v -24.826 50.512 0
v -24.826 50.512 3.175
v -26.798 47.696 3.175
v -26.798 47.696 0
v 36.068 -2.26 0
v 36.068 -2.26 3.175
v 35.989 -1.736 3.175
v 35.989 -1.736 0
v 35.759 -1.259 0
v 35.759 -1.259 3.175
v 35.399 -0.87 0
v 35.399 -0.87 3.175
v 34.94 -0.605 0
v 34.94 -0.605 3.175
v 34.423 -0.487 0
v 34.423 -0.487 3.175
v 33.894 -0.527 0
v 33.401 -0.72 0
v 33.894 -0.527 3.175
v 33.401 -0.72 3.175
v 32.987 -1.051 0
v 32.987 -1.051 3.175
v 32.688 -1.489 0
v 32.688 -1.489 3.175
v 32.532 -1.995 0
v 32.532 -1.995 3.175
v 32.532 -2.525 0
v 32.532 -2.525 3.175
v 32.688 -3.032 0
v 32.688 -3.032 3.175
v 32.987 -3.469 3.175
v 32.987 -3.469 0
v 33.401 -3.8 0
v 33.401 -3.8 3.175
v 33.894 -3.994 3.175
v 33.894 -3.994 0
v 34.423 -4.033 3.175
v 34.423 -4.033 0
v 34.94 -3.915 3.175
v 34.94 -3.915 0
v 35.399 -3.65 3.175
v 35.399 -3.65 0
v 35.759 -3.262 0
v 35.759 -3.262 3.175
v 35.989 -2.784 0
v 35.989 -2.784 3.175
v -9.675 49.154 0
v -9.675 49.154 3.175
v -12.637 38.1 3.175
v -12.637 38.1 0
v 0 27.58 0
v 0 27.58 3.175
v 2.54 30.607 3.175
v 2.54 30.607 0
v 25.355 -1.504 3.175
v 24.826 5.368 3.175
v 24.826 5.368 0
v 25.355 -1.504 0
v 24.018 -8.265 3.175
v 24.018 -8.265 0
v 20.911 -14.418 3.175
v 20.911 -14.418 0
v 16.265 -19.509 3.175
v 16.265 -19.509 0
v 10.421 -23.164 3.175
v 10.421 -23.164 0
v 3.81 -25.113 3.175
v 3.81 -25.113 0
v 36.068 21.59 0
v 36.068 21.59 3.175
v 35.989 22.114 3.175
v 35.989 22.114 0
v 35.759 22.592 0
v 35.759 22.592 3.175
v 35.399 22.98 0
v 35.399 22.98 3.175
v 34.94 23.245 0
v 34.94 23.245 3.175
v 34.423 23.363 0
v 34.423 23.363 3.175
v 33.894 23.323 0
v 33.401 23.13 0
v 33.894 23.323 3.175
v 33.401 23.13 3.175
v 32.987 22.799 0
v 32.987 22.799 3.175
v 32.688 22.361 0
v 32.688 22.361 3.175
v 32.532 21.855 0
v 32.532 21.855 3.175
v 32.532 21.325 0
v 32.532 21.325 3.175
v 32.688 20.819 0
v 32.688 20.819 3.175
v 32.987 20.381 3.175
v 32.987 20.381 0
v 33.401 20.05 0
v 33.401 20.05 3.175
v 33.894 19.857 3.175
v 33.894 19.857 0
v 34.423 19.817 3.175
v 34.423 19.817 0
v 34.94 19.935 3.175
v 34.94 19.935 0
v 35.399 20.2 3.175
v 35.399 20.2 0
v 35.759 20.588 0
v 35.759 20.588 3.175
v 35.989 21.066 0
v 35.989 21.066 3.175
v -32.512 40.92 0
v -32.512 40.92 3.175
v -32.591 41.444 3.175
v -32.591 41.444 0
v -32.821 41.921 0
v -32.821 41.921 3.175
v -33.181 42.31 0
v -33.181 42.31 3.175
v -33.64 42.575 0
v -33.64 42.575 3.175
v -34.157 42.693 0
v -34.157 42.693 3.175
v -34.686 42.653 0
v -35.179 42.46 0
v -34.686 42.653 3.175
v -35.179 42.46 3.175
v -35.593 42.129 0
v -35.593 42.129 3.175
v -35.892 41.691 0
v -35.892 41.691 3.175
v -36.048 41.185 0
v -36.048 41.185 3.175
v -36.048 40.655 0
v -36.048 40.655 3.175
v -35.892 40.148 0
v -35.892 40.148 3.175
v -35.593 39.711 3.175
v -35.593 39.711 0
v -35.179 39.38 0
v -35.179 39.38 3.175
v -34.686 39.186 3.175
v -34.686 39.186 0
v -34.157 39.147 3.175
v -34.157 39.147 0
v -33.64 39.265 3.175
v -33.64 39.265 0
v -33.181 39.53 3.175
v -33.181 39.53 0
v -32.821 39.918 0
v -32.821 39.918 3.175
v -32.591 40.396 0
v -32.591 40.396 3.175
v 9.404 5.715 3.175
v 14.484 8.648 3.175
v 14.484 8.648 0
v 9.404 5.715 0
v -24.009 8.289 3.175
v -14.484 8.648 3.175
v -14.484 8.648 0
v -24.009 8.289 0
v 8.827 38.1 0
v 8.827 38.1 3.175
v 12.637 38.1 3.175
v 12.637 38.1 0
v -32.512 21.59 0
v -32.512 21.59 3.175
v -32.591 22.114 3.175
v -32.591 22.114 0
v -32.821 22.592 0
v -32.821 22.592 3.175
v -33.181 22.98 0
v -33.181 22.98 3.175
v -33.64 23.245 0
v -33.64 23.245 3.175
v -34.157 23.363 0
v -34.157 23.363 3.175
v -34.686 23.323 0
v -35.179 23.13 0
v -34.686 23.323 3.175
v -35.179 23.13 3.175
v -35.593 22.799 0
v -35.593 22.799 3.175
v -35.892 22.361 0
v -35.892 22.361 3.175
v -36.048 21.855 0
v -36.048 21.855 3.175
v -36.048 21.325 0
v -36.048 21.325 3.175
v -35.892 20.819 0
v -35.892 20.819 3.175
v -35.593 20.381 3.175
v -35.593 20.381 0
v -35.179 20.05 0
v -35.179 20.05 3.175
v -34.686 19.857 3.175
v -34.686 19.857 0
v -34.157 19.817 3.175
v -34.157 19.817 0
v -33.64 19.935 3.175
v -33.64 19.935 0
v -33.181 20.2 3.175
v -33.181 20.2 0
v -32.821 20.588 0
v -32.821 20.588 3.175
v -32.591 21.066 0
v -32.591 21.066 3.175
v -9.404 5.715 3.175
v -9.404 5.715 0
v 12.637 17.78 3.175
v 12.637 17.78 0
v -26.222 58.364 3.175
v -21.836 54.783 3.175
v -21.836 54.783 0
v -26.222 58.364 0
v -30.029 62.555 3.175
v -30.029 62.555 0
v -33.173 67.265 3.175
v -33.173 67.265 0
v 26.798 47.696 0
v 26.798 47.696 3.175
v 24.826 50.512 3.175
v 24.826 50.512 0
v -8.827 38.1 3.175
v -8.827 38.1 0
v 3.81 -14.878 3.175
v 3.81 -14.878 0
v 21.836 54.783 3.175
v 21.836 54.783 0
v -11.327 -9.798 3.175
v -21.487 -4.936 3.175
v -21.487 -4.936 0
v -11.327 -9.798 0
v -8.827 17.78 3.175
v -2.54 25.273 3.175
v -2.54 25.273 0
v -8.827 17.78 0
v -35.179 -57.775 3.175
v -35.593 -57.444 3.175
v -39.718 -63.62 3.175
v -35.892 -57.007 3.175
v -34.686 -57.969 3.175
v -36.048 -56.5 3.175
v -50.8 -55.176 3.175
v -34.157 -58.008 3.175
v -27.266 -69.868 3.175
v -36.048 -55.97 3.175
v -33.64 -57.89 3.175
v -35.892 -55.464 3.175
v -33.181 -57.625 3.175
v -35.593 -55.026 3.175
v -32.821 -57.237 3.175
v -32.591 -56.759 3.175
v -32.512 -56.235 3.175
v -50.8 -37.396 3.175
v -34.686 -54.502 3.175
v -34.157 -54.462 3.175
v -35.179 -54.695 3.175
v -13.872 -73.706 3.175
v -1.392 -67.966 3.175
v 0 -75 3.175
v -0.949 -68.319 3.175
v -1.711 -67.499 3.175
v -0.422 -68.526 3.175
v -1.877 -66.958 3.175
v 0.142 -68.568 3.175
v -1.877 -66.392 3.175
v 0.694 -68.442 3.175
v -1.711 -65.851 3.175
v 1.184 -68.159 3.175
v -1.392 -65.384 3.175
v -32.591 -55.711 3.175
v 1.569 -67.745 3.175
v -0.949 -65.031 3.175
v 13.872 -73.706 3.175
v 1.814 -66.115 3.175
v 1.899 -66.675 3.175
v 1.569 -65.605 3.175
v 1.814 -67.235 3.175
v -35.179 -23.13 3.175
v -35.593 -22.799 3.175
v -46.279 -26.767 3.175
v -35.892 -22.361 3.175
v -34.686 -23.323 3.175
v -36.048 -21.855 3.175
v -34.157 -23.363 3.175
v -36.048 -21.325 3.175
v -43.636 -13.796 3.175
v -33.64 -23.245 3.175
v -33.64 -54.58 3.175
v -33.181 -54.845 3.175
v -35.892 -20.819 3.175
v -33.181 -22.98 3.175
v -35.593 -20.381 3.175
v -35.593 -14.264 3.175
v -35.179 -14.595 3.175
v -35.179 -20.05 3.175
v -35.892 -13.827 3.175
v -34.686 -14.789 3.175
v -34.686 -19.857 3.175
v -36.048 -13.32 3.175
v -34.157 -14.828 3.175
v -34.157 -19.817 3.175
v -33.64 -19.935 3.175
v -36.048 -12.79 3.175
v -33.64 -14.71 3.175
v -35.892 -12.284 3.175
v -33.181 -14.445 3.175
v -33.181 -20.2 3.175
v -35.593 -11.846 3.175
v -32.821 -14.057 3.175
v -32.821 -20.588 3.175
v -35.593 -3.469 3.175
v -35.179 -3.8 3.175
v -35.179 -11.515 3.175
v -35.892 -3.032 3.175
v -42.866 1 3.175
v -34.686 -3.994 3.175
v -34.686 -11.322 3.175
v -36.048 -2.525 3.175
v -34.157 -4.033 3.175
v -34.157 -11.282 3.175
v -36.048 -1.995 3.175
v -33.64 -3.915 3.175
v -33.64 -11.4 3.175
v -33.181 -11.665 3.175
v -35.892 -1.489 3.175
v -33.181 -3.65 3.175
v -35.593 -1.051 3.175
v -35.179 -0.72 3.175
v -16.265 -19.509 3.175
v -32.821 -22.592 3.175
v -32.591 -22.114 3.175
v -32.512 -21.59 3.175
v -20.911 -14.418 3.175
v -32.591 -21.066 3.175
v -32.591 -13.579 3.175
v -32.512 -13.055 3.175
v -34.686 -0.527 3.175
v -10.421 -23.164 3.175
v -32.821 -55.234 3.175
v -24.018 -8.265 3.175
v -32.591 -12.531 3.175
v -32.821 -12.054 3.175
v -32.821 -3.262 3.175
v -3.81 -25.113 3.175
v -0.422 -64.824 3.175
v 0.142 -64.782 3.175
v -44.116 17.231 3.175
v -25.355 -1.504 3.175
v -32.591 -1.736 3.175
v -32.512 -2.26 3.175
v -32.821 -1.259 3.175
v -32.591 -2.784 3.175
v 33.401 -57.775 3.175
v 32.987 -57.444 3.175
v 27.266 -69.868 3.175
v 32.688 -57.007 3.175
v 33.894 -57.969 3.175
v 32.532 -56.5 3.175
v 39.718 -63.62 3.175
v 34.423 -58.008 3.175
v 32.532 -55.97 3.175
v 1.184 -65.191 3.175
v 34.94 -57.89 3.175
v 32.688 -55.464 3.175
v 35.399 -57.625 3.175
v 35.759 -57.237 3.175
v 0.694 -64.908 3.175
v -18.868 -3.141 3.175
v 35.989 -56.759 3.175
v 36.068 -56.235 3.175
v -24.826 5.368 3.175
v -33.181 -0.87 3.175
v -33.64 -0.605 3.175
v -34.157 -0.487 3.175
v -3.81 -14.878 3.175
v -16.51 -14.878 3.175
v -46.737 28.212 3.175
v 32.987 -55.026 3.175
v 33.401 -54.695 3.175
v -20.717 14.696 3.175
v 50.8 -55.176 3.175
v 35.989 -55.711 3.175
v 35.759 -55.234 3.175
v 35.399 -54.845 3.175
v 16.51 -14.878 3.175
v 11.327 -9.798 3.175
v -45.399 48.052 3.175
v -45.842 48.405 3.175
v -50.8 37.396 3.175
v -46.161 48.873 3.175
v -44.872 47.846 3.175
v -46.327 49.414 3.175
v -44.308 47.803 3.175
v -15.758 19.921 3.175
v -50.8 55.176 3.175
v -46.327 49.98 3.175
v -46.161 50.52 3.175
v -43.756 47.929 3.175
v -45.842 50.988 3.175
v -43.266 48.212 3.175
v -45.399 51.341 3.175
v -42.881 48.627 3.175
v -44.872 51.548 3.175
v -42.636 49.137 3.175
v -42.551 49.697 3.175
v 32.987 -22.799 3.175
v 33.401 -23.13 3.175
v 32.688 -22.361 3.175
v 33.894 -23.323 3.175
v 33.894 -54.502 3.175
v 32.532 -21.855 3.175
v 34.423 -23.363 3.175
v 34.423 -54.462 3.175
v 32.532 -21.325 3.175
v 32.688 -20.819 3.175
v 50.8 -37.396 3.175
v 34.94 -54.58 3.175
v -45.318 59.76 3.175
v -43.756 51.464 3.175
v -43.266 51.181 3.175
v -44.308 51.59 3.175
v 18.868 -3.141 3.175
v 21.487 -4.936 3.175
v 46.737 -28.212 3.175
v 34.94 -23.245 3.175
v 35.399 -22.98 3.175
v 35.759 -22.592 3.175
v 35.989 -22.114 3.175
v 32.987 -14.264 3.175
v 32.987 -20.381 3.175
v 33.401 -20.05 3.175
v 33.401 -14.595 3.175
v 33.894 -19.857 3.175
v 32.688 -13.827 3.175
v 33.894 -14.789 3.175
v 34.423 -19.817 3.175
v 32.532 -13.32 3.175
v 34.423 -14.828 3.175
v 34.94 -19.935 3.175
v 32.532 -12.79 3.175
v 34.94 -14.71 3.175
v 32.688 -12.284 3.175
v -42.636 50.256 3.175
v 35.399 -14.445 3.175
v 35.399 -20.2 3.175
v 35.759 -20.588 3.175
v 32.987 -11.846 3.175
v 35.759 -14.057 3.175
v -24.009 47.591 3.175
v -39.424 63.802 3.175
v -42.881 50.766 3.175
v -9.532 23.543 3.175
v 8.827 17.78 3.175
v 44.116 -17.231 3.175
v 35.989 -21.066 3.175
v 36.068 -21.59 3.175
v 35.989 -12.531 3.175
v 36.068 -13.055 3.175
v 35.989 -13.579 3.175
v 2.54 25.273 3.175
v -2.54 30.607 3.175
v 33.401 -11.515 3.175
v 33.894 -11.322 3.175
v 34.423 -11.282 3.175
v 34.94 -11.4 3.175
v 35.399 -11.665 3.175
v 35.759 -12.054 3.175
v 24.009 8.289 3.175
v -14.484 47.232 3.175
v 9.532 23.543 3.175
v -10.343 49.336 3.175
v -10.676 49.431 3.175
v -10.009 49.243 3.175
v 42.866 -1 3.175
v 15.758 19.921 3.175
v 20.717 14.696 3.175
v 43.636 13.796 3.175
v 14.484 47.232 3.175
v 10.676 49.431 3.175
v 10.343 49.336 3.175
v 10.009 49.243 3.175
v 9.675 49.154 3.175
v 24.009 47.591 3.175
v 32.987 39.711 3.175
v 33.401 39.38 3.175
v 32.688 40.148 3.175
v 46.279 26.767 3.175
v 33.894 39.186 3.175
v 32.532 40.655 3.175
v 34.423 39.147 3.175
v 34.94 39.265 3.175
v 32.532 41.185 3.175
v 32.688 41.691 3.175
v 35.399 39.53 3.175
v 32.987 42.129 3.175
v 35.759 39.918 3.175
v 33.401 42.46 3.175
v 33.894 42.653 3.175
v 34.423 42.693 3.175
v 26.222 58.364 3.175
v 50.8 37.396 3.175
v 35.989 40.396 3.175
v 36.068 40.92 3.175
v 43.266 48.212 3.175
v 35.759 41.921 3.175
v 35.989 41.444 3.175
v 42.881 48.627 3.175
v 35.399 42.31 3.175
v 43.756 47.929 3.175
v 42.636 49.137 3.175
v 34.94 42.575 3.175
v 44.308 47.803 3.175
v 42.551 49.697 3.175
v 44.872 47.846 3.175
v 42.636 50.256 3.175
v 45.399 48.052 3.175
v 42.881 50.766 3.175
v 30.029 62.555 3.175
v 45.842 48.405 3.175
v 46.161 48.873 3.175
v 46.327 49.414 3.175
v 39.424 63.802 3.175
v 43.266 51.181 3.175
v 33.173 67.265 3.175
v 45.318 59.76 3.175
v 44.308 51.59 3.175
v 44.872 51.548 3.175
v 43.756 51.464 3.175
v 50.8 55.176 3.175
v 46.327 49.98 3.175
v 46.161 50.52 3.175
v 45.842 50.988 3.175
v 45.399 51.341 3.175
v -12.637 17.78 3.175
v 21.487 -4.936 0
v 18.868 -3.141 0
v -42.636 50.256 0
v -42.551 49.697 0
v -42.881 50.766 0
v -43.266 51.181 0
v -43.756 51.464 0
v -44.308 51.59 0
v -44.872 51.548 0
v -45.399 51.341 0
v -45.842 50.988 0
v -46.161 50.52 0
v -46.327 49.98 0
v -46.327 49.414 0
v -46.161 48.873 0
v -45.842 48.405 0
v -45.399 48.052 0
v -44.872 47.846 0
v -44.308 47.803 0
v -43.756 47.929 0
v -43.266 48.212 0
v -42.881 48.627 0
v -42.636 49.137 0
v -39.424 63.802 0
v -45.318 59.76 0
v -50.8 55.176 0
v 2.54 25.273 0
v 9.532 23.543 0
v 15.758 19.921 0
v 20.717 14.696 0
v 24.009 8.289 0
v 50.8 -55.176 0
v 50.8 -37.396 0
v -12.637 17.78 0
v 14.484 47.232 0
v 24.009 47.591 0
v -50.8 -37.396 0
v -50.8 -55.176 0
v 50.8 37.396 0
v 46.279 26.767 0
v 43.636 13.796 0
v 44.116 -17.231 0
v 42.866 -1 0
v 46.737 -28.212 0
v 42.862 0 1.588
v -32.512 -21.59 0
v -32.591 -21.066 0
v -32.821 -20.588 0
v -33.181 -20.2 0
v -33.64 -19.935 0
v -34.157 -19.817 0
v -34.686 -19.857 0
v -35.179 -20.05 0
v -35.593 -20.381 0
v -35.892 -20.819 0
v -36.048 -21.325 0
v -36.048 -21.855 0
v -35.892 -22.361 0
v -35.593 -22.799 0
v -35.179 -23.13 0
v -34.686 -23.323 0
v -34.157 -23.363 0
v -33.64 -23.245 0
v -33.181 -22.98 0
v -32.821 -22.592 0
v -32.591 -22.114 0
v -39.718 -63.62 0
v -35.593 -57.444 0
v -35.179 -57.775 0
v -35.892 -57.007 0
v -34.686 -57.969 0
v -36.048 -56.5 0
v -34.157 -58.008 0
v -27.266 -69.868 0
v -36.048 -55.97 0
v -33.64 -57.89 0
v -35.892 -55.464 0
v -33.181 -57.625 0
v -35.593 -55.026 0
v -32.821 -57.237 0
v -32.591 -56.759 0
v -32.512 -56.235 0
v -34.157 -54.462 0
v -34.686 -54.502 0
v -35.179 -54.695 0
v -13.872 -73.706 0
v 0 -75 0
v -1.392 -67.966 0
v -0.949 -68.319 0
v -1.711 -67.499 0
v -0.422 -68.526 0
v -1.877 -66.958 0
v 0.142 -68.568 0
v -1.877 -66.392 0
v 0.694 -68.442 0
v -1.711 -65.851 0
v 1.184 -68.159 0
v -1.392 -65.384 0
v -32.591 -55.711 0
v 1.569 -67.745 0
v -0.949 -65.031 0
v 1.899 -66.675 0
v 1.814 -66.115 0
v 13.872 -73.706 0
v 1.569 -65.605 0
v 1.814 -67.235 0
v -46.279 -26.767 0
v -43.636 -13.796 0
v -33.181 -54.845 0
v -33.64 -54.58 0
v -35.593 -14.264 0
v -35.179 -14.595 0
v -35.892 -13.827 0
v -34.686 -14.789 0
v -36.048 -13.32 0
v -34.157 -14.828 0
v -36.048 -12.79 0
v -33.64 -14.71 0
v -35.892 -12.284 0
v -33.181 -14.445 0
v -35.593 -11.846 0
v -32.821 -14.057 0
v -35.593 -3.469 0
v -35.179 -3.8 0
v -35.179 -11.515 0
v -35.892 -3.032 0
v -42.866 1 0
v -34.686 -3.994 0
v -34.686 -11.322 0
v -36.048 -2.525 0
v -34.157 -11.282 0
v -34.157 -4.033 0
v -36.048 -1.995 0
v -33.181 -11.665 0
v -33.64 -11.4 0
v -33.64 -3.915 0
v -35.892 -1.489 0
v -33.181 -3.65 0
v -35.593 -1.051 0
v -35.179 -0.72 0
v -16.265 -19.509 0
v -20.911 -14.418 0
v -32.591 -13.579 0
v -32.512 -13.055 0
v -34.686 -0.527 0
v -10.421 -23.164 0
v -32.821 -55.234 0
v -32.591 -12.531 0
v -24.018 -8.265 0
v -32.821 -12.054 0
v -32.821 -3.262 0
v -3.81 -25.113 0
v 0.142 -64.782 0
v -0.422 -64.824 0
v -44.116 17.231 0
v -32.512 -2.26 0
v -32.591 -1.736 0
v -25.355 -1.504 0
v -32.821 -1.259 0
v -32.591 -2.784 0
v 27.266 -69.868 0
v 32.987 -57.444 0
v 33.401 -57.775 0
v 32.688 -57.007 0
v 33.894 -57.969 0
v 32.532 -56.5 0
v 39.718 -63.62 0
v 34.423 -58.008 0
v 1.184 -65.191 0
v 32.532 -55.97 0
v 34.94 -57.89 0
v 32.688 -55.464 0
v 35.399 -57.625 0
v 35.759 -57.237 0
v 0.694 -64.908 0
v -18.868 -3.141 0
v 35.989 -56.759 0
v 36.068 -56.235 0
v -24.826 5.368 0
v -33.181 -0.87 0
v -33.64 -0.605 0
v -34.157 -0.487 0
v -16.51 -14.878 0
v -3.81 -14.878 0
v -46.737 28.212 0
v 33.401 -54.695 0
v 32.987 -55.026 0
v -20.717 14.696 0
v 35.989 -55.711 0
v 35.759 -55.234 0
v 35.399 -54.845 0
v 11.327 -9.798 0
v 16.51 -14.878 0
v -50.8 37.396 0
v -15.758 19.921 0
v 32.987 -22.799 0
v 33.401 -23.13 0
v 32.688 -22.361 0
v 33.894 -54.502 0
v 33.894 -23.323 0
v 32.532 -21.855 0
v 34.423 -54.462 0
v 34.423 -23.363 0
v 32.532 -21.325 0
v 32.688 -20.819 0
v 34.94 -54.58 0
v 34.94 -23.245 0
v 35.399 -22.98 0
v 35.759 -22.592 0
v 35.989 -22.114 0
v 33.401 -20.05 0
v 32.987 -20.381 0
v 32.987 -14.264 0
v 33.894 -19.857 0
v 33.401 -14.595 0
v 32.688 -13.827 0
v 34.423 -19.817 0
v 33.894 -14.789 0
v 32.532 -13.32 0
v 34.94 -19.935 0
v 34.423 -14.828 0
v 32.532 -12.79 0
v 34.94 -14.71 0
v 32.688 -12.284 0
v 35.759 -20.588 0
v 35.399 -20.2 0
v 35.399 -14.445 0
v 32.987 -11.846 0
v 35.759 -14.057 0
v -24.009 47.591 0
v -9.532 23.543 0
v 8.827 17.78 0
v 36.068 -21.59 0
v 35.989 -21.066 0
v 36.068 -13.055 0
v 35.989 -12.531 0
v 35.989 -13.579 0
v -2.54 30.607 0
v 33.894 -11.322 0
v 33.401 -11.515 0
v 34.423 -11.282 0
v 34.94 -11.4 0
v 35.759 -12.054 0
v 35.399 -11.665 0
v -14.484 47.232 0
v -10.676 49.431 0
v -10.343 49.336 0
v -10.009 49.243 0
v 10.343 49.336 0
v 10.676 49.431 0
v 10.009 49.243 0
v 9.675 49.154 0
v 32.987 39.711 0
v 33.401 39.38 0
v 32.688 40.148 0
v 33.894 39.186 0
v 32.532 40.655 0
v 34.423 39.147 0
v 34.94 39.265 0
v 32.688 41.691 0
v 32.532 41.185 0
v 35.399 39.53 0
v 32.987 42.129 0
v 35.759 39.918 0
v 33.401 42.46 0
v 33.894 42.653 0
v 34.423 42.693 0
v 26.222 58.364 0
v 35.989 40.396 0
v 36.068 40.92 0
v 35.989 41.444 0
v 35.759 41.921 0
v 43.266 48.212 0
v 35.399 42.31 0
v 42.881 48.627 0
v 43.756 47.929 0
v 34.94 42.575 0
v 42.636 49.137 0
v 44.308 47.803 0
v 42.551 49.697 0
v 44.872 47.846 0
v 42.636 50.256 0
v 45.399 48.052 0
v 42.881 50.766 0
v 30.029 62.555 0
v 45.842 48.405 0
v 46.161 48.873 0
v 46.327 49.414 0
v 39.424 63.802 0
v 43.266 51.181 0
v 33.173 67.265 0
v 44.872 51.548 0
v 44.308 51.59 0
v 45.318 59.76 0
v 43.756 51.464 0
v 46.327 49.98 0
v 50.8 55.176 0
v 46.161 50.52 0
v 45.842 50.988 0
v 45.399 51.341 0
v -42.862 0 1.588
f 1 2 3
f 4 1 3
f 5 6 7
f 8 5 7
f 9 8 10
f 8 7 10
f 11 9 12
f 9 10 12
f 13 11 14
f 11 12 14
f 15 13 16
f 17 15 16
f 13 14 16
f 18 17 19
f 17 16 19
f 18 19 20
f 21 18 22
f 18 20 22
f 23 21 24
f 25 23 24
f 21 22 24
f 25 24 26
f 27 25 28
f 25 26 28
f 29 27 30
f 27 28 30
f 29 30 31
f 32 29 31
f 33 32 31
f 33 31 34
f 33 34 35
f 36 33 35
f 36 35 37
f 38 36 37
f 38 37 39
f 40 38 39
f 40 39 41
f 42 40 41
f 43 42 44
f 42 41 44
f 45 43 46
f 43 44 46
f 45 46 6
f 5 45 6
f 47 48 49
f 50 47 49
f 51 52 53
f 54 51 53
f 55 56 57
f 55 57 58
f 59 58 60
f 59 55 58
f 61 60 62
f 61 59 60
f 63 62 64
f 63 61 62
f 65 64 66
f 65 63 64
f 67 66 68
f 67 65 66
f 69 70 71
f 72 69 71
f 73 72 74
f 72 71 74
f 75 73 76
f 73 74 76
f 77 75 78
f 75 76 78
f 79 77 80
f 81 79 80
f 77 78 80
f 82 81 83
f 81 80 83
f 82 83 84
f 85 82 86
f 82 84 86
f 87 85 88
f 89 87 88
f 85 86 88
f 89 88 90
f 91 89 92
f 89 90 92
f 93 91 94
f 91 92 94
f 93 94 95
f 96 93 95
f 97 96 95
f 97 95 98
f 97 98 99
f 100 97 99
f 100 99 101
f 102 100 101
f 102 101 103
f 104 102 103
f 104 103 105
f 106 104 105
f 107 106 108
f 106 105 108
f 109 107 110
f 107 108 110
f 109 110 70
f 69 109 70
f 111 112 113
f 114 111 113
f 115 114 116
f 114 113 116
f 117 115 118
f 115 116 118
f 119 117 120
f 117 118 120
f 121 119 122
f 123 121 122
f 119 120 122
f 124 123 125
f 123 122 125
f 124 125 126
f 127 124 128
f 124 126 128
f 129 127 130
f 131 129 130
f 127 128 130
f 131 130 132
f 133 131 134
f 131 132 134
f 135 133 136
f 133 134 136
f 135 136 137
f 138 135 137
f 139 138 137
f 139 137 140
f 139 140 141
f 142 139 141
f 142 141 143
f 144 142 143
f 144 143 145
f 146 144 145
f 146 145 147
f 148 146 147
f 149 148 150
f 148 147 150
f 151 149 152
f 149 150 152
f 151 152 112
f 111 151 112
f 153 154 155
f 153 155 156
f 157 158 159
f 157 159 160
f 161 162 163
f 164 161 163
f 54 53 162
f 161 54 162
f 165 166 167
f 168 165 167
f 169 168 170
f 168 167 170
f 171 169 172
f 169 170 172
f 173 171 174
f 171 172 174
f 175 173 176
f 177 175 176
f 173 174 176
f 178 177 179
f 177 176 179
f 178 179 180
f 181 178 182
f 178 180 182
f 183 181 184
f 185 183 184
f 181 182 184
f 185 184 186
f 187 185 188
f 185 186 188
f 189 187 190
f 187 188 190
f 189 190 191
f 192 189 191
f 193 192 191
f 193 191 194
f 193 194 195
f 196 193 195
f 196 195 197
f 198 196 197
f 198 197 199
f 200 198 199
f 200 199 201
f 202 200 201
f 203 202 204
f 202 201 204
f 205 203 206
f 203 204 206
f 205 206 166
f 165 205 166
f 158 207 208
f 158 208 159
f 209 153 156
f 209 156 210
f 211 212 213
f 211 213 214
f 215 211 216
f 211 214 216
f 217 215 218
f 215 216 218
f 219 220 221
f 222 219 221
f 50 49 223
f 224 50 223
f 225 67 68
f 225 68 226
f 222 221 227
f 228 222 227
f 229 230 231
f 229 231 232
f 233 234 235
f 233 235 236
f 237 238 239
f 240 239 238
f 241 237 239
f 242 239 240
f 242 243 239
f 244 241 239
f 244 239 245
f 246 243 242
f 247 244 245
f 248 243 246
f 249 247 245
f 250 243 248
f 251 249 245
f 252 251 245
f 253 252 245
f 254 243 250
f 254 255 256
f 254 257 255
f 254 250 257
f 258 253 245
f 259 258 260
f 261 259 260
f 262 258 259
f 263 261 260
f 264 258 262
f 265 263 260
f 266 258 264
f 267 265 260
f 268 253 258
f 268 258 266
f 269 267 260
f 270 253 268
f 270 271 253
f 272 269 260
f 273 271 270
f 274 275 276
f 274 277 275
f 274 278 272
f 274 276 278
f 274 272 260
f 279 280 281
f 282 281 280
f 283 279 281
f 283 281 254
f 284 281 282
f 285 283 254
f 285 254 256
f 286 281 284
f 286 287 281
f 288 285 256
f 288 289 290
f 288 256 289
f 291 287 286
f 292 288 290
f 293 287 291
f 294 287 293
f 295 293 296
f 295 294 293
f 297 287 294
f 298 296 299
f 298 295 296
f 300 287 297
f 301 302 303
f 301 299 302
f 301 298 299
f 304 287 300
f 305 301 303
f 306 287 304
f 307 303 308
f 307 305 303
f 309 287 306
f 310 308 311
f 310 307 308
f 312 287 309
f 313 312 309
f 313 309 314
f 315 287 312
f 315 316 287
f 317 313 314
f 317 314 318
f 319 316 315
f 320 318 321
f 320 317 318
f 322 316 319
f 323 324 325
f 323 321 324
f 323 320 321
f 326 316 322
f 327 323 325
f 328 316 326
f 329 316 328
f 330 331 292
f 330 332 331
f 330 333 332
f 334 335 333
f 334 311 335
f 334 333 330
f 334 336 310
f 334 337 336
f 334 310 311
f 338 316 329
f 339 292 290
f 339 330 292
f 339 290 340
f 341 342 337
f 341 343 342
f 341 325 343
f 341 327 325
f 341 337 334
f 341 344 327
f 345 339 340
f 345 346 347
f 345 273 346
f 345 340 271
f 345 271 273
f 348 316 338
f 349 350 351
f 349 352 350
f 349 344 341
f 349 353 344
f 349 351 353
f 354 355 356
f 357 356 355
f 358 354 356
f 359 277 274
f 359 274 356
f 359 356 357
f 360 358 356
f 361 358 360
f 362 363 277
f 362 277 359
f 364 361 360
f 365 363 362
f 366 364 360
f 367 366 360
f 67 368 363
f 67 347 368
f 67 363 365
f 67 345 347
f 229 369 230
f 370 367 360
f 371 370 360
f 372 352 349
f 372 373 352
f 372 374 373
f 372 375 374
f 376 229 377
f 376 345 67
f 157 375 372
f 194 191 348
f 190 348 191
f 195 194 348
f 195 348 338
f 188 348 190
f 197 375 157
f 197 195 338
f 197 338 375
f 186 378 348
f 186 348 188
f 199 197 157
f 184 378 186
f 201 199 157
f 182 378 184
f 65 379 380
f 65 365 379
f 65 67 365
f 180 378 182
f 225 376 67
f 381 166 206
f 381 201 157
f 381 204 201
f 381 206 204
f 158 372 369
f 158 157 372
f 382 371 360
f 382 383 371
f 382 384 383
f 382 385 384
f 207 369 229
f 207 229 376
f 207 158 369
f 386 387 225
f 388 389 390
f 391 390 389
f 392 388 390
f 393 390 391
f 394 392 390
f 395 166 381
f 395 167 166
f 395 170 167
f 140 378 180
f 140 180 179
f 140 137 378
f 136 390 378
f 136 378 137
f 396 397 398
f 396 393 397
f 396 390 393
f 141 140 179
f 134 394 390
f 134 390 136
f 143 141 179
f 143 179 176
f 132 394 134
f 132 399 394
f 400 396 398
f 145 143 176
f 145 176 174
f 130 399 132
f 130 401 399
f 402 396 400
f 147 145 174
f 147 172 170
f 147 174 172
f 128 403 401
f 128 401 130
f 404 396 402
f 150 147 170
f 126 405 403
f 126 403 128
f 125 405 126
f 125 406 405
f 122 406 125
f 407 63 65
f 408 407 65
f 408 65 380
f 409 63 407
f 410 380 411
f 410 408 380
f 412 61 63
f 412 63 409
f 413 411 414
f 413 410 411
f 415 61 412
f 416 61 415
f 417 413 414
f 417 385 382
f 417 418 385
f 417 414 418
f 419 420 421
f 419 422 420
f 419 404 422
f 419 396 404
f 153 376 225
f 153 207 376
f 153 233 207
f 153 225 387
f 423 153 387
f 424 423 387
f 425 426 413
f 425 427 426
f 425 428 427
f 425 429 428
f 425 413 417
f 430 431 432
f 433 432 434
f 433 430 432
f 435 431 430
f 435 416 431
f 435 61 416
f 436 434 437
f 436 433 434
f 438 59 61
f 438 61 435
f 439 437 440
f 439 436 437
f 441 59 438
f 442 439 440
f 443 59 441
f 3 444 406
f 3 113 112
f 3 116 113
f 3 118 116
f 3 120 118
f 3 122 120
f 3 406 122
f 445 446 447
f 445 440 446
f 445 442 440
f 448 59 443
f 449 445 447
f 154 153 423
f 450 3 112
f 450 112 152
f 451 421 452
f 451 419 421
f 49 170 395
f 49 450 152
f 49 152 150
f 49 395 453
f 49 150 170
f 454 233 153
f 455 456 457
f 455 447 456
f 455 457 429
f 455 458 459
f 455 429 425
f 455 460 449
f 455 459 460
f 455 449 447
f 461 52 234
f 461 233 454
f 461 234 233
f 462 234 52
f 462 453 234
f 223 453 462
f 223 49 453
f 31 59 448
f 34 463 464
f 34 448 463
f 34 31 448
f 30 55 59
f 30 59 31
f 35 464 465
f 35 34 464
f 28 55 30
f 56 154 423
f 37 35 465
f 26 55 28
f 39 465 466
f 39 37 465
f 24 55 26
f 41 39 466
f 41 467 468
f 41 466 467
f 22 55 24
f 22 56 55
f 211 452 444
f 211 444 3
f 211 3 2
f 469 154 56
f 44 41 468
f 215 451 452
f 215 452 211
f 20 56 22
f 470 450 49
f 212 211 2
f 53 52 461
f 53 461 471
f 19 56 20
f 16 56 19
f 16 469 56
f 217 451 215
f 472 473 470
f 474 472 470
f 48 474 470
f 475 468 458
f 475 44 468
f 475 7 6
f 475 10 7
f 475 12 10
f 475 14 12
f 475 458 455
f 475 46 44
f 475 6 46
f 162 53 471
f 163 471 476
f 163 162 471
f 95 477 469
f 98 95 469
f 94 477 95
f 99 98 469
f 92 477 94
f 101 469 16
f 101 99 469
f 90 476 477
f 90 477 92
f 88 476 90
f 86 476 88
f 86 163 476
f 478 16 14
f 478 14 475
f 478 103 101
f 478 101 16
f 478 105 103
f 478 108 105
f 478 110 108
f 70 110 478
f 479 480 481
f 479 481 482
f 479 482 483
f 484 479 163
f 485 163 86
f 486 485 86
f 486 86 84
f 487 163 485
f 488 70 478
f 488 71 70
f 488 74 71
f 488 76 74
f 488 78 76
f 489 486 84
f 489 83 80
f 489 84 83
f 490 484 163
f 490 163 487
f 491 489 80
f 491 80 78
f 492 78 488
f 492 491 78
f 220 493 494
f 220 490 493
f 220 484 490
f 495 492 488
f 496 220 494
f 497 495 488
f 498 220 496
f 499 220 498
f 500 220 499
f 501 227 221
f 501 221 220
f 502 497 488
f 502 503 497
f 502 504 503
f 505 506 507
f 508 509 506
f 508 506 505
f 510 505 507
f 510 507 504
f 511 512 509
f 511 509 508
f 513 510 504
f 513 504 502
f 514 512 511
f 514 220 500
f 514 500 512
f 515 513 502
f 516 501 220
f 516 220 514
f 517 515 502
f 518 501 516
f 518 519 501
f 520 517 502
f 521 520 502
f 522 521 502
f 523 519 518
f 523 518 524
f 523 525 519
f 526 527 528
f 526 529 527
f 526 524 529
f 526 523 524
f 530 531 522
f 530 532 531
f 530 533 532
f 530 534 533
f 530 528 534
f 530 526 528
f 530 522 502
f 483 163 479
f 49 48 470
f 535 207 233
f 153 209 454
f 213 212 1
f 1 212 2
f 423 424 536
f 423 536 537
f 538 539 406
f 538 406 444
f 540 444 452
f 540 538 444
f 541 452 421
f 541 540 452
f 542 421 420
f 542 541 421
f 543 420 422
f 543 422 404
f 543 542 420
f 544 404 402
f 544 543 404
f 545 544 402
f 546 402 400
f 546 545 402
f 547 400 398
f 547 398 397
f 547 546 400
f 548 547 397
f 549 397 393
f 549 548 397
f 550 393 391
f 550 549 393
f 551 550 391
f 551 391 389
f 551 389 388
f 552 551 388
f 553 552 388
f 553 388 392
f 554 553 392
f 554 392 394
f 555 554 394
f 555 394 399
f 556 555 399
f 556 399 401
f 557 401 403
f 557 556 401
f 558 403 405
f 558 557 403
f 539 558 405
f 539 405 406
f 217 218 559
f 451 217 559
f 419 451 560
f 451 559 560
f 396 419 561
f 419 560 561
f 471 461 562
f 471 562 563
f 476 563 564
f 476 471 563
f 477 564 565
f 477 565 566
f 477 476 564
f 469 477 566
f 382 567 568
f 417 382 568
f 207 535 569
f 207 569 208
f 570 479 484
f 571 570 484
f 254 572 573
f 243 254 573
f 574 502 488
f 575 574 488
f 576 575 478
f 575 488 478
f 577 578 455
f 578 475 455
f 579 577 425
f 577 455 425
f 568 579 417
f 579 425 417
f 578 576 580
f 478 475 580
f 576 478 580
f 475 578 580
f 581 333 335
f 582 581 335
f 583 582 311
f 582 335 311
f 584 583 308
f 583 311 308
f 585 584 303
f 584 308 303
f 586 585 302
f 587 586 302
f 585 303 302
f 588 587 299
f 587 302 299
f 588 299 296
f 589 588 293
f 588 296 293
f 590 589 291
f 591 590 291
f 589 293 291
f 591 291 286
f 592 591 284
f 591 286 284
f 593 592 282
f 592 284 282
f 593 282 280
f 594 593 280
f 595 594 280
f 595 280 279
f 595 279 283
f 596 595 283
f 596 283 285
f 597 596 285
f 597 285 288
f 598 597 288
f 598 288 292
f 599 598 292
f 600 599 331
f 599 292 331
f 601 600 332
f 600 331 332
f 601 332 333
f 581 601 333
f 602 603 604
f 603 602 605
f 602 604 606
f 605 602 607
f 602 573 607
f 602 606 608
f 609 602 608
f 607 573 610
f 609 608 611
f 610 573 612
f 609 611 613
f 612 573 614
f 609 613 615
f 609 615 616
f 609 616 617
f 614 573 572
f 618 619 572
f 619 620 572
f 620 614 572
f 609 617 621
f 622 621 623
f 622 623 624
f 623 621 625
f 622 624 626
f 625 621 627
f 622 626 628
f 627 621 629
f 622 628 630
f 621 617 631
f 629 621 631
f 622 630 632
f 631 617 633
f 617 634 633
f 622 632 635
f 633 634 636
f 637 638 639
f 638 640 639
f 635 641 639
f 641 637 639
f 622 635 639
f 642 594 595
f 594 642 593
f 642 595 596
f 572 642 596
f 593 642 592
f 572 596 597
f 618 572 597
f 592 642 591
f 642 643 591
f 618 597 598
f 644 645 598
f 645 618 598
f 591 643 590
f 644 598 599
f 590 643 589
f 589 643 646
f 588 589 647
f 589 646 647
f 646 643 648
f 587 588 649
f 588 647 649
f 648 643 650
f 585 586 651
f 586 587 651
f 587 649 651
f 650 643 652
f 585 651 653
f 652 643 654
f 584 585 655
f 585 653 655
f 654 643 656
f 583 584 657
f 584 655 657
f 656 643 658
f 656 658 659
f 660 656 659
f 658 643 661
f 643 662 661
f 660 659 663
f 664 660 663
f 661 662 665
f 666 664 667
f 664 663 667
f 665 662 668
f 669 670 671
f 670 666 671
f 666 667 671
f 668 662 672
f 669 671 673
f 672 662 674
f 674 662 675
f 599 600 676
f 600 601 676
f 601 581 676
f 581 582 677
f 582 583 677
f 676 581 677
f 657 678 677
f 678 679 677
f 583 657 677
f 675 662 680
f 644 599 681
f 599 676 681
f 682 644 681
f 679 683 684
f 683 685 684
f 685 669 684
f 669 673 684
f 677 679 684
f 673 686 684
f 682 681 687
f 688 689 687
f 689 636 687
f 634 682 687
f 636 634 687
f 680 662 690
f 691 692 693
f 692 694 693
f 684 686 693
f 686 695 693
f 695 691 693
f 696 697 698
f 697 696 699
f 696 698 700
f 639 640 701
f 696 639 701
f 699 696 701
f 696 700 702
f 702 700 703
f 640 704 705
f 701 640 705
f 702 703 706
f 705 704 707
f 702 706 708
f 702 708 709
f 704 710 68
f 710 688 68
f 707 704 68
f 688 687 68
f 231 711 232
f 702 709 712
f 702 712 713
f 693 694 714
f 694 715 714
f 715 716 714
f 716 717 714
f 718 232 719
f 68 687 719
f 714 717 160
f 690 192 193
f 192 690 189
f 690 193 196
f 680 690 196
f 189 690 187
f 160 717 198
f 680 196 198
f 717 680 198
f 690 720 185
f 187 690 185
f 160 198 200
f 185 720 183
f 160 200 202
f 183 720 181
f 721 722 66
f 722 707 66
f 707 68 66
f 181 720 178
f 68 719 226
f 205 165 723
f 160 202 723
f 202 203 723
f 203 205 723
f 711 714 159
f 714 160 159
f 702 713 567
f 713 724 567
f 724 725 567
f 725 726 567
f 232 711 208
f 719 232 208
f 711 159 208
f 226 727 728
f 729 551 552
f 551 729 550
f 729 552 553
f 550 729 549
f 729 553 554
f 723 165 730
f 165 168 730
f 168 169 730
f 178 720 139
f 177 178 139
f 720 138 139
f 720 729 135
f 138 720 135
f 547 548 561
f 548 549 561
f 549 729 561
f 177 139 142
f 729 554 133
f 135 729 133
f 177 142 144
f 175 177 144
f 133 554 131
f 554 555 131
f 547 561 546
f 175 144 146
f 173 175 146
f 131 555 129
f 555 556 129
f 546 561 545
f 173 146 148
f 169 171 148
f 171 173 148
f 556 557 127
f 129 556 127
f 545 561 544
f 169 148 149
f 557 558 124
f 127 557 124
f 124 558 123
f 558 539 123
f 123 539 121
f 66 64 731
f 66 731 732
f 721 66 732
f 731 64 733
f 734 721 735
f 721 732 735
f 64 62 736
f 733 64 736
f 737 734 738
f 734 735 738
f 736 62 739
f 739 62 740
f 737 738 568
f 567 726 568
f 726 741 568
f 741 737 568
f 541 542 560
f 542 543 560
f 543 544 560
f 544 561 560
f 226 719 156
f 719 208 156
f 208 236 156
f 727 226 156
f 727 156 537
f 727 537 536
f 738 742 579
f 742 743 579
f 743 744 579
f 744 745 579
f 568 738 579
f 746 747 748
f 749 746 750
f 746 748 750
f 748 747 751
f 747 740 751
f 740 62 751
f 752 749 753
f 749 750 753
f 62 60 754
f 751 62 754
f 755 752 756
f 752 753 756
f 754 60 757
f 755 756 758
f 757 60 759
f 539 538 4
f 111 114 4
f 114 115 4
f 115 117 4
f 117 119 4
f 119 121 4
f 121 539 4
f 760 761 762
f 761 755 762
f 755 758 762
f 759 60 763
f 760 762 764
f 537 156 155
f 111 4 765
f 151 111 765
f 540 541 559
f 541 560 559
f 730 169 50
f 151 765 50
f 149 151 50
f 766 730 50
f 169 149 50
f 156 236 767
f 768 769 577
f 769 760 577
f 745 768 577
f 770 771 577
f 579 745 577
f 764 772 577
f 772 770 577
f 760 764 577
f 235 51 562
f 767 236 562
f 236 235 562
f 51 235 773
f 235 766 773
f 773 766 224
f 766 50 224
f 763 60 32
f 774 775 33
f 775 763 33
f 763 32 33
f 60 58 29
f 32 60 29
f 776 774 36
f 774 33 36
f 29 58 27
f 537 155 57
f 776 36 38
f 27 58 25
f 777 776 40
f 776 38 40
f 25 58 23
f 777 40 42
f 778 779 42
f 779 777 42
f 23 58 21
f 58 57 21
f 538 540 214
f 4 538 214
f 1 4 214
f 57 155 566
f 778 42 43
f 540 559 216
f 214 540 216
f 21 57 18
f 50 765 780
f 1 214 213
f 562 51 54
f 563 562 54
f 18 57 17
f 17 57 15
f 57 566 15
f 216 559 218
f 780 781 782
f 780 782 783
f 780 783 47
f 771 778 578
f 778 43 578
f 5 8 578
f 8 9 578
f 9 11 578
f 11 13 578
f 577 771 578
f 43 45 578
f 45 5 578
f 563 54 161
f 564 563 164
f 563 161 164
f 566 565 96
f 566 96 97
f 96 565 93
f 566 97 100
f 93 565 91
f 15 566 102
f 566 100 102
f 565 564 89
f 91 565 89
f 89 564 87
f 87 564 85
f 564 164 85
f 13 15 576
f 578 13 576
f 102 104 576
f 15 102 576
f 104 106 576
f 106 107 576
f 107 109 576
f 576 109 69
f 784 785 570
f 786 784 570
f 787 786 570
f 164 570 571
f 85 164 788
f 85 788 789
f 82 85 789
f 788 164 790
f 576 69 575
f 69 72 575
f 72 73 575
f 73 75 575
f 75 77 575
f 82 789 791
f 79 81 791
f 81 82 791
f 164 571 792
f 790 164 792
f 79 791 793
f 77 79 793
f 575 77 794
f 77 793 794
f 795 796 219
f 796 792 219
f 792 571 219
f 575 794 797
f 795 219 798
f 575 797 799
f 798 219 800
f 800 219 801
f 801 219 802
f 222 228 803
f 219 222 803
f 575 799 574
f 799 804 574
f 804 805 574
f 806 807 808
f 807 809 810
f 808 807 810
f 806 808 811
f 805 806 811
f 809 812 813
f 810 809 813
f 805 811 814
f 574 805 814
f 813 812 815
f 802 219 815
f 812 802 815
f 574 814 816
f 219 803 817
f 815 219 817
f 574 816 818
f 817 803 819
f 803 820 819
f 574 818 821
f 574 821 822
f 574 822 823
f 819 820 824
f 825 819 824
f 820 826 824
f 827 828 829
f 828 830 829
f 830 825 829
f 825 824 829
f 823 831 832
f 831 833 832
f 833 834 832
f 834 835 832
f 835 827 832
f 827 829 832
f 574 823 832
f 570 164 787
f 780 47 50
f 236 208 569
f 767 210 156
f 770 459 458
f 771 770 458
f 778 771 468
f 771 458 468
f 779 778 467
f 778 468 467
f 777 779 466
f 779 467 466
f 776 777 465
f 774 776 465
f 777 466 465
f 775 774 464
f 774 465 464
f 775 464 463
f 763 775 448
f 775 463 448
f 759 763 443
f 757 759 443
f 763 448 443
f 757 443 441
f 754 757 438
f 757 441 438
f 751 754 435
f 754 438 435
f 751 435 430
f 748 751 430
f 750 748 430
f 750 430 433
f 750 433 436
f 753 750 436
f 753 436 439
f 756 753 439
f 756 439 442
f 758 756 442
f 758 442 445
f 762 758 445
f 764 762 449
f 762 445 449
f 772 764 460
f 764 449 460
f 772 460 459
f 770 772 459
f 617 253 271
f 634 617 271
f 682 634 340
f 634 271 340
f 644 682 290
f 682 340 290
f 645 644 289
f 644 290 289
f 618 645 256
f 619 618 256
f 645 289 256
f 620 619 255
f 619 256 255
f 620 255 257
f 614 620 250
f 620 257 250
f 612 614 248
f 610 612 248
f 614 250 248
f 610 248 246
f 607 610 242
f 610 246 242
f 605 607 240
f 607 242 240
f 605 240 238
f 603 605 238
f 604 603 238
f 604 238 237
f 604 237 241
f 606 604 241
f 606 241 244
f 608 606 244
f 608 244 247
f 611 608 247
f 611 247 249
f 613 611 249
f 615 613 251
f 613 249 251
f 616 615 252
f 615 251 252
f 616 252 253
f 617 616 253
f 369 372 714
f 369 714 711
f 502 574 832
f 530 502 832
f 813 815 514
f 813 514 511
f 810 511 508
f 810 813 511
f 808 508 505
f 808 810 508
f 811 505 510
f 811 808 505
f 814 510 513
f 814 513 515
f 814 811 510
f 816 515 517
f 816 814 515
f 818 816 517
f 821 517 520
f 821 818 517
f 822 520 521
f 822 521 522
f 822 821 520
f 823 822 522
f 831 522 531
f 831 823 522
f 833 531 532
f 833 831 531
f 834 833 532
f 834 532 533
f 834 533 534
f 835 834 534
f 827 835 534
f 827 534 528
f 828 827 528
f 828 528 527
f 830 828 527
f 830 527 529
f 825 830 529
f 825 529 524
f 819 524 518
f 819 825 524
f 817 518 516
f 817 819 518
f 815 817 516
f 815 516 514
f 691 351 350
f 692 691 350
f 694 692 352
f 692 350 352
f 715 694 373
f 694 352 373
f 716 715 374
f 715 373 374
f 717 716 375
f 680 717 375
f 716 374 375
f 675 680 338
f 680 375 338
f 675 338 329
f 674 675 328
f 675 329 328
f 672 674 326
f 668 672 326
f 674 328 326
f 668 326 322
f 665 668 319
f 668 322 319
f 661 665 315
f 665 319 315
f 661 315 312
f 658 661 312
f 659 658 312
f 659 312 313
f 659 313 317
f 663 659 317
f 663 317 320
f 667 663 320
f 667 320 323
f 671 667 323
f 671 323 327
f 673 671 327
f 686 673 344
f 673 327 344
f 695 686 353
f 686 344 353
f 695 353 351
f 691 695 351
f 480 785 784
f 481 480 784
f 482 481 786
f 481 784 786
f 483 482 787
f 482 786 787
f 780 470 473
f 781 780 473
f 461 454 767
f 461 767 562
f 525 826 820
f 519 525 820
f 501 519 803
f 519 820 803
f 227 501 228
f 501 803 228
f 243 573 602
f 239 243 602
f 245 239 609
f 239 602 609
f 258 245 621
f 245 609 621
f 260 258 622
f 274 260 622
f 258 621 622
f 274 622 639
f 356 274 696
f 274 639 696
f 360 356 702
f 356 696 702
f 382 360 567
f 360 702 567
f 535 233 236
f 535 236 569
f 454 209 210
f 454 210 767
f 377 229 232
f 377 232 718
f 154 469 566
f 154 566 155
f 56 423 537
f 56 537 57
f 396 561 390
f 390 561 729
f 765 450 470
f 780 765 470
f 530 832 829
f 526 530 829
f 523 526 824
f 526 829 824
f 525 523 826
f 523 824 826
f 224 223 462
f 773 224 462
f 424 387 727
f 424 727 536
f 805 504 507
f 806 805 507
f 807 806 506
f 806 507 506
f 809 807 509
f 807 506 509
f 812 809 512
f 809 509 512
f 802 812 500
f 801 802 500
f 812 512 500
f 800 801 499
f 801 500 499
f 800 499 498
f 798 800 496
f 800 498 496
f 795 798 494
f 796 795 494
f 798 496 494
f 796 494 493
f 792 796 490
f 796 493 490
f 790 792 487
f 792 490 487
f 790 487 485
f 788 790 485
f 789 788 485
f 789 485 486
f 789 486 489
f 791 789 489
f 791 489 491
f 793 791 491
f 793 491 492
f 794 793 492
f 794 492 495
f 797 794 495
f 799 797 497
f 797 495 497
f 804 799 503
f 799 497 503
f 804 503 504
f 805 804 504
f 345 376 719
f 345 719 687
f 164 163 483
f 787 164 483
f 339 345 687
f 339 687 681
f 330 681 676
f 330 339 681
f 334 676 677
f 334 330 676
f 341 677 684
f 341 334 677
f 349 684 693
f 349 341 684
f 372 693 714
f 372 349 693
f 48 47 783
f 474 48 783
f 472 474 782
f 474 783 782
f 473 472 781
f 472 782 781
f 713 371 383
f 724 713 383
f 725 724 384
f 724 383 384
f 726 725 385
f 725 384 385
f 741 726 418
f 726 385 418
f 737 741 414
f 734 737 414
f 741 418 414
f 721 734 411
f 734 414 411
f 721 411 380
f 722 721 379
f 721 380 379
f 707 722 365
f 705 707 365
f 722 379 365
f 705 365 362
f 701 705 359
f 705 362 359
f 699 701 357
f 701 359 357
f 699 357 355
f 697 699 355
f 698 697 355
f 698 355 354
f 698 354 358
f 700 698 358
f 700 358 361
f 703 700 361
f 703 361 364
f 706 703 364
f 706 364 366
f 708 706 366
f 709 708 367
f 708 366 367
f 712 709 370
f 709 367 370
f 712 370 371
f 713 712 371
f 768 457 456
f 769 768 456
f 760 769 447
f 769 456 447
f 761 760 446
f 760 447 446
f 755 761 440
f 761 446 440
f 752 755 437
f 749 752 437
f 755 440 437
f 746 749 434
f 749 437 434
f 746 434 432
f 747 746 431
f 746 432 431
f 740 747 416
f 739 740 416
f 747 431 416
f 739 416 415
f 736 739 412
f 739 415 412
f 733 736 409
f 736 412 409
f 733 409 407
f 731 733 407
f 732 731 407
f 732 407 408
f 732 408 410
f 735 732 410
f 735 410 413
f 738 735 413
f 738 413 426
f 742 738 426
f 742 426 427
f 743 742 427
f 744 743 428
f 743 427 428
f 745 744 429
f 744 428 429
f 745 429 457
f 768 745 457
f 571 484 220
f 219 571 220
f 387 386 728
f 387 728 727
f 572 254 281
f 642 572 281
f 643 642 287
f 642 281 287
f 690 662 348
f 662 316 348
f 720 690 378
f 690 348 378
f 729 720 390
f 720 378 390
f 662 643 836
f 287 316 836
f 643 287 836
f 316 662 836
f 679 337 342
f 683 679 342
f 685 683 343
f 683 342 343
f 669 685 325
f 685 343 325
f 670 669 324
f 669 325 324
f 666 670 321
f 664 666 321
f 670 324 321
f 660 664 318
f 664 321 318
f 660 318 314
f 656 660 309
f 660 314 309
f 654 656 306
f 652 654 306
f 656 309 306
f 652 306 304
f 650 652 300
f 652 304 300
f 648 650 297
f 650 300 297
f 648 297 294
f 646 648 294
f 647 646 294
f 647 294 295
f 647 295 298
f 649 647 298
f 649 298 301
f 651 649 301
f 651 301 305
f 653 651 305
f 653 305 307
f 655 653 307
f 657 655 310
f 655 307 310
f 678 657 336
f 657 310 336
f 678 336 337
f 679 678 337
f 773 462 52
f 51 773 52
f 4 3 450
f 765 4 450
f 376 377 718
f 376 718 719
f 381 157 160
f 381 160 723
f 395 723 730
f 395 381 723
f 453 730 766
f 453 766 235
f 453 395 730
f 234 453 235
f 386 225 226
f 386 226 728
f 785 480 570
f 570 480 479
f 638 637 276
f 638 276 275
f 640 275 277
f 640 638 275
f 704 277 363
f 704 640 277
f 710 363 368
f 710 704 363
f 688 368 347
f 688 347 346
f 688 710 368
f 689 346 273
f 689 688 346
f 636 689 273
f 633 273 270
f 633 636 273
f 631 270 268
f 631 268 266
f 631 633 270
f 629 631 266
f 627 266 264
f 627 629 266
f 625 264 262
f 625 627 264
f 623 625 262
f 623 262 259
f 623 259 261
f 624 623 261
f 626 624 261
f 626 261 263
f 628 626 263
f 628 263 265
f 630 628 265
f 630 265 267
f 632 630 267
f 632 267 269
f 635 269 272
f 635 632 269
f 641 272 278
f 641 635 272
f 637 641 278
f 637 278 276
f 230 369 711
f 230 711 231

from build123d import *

# Parameters (mm, degrees)
SKETCH1_R           = 1.89865
BOSS_EXTRUDE3_DEPTH = 3.175
CUT_EXTRUDE2_DEPTH  = 3.175
SKETCH4_R           = 1.778
CUT_EXTRUDE3_DEPTH  = 3.175
SKETCH5_R           = 1.778
CUT_EXTRUDE4_DEPTH  = 3.175
CUT_EXTRUDE5_DEPTH  = 3.175
CUT_EXTRUDE6_DEPTH  = 3.175


with BuildPart() as part:
    # Sketch1 → Boss-Extrude3 (new body)
    with BuildSketch(Plane.XY):
        with BuildLine():
            Line((-50.8, 55.175719298), (-50.8, -55.175719298))
            ThreePointArc((-50.8, -55.175719298), (0, -75), (50.8, -55.175719298))
            Line((50.8, -55.175719298), (50.8, 55.175719298))
            ThreePointArc((50.8, 55.175719298), (42.419210034, 61.851520758), (33.172661219, 67.264957799))
            ThreePointArc((33.172661219, 67.264957799), (0, 47.904876359), (-33.172661219, 67.264957799))
            ThreePointArc((-33.172661219, 67.264957799), (-42.419210034, 61.851520758), (-50.8, 55.175719298))
        make_face()
        with Locations((0, -66.675)):
            Circle(SKETCH1_R, mode=Mode.SUBTRACT)
        with Locations((-44.45, 49.6966108)):
            Circle(SKETCH1_R, mode=Mode.SUBTRACT)
        with Locations(Location((44.45, 49.6966108, 0), (0, 0, 180))):
            Circle(SKETCH1_R, mode=Mode.SUBTRACT)
    extrude(amount=BOSS_EXTRUDE3_DEPTH)

    # Sketch3 → Cut-Extrude2 (cut)
    with BuildSketch(Plane.XY.offset(3.175)):
        with BuildLine():
            Line((8.827105782, 17.78), (2.54, 25.272680903))
            ThreePointArc((2.54, 25.272680903), (15.758317518, 19.920728626), (24.009298775, 8.289365013))
            Line((24.009298775, 8.289365013), (14.484298775, 8.647939367))
            Line((14.484298775, 8.647939367), (9.404298775, 5.715))
            Line((9.404298775, 5.715), (12.637105782, 17.78))
            Line((12.637105782, 17.78), (8.827105782, 17.78))
        make_face()
        with BuildLine():
            Line((18.868143133, -3.140634987), (24.826209076, 5.368365013))
            ThreePointArc((24.826209076, 5.368365013), (20.911260009, -14.418016674), (3.81, -25.112624315))
            Line((3.81, -25.112624315), (3.81, -14.877877919))
            Line((3.81, -14.877877919), (16.51, -14.877877919))
            Line((16.51, -14.877877919), (11.327081569, -9.797877919))
            Line((11.327081569, -9.797877919), (21.487081569, -4.935568543))
            Line((21.487081569, -4.935568543), (18.868143133, -3.140634987))
        make_face()
        with BuildLine():
            Line((-3.81, -14.877877919), (-3.81, -25.112624315))
            ThreePointArc((-3.81, -25.112624315), (-20.911260009, -14.418016674), (-24.826209076, 5.368365013))
            Line((-24.826209076, 5.368365013), (-18.868143133, -3.140634987))
            Line((-18.868143133, -3.140634987), (-21.487081569, -4.935568543))
            Line((-21.487081569, -4.935568543), (-11.327081569, -9.797877919))
            Line((-11.327081569, -9.797877919), (-16.51, -14.877877919))
            Line((-16.51, -14.877877919), (-3.81, -14.877877919))
        make_face()
        with BuildLine():
            Line((-14.484298775, 8.647939367), (-24.009298775, 8.289365013))
            ThreePointArc((-24.009298775, 8.289365013), (-15.758317518, 19.920728626), (-2.54, 25.272680903))
            Line((-2.54, 25.272680903), (-8.827105782, 17.78))
            Line((-8.827105782, 17.78), (-12.637105782, 17.78))
            Line((-12.637105782, 17.78), (-9.404298775, 5.715))
            Line((-9.404298775, 5.715), (-14.484298775, 8.647939367))
        make_face()
    extrude(amount=-CUT_EXTRUDE2_DEPTH, mode=Mode.SUBTRACT)

    # Sketch4 → Cut-Extrude3 (cut)
    with BuildSketch(Plane.XY.offset(3.175)):
        with Locations((-34.29, 40.919876359)):
            Circle(SKETCH4_R)
        with Locations((34.29, 40.919876359)):
            Circle(SKETCH4_R)
        with Locations((34.29, -2.260123641)):
            Circle(SKETCH4_R)
        with Locations((-34.29, -2.260123641)):
            Circle(SKETCH4_R)
        with Locations((-34.29, -13.055123641)):
            Circle(SKETCH4_R)
        with Locations((34.29, -13.055123641)):
            Circle(SKETCH4_R)
        with Locations((34.29, -56.235123641)):
            Circle(SKETCH4_R)
        with Locations((-34.29, -56.235123641)):
            Circle(SKETCH4_R)
    extrude(amount=-CUT_EXTRUDE3_DEPTH, mode=Mode.SUBTRACT)

    # Sketch5 → Cut-Extrude4 (cut)
    with BuildSketch(Plane.XY.offset(3.175)):
        with Locations((-34.29, 21.59)):
            Circle(SKETCH5_R)
        with Locations((34.29, 21.59)):
            Circle(SKETCH5_R)
        with Locations((34.29, -21.59)):
            Circle(SKETCH5_R)
        with Locations((-34.29, -21.59)):
            Circle(SKETCH5_R)
    extrude(amount=-CUT_EXTRUDE4_DEPTH, mode=Mode.SUBTRACT)

    # Sketch6 → Cut-Extrude5 (cut)
    with BuildSketch(Plane.XY.offset(3.175)):
        Polygon((-8.827105782, 38.1), (-2.54, 30.607319097), (0, 27.580264972), (2.54, 30.607319097), (8.827105782, 38.1), (12.637105782, 38.1), (9.404298775, 50.165), (14.484298775, 47.232060633), (24.009298775, 47.590634987), (26.798005722, 47.695617537), (24.826209076, 50.511634987), (18.868143133, 59.020634987), (-18.868143133, 59.020634987), (-24.826209076, 50.511634987), (-26.798005722, 47.695617537), (-24.009298775, 47.590634987), (-14.484298775, 47.232060633), (-9.404298775, 50.165), (-12.637105782, 38.1), align=None)
    extrude(amount=-CUT_EXTRUDE5_DEPTH, mode=Mode.SUBTRACT)

    # Sketch7 → Cut-Extrude6 (cut)
    with BuildSketch(Plane.XY.offset(3.175)):
        with BuildLine():
            Line((-50.8, 37.395719298), (-50.8, -37.395719298))
            add(Edge.make_bspline(
                [(-50.8, -37.395719298), (-42.8625, -23.647566012), (-42.8625, 0)],
                knots=[0, 0, 0, 1, 1, 1], degree=2))
            add(Edge.make_bspline(
                [(-50.8, 37.395719298), (-42.8625, 23.647566012), (-42.8625, 0)],
                knots=[0, 0, 0, 1, 1, 1], degree=2))
        make_face()
        with BuildLine():
            Line((50.8, 37.395719298), (50.8, -37.395719298))
            add(Edge.make_bspline(
                [(50.8, -37.395719298), (42.8625, -23.647566012), (42.8625, 0)],
                knots=[0, 0, 0, 1, 1, 1], degree=2))
            add(Edge.make_bspline(
                [(50.8, 37.395719298), (42.8625, 23.647566012), (42.8625, 0)],
                knots=[0, 0, 0, 1, 1, 1], degree=2))
        make_face()
    extrude(amount=-CUT_EXTRUDE6_DEPTH, mode=Mode.SUBTRACT)


solid = part.part
